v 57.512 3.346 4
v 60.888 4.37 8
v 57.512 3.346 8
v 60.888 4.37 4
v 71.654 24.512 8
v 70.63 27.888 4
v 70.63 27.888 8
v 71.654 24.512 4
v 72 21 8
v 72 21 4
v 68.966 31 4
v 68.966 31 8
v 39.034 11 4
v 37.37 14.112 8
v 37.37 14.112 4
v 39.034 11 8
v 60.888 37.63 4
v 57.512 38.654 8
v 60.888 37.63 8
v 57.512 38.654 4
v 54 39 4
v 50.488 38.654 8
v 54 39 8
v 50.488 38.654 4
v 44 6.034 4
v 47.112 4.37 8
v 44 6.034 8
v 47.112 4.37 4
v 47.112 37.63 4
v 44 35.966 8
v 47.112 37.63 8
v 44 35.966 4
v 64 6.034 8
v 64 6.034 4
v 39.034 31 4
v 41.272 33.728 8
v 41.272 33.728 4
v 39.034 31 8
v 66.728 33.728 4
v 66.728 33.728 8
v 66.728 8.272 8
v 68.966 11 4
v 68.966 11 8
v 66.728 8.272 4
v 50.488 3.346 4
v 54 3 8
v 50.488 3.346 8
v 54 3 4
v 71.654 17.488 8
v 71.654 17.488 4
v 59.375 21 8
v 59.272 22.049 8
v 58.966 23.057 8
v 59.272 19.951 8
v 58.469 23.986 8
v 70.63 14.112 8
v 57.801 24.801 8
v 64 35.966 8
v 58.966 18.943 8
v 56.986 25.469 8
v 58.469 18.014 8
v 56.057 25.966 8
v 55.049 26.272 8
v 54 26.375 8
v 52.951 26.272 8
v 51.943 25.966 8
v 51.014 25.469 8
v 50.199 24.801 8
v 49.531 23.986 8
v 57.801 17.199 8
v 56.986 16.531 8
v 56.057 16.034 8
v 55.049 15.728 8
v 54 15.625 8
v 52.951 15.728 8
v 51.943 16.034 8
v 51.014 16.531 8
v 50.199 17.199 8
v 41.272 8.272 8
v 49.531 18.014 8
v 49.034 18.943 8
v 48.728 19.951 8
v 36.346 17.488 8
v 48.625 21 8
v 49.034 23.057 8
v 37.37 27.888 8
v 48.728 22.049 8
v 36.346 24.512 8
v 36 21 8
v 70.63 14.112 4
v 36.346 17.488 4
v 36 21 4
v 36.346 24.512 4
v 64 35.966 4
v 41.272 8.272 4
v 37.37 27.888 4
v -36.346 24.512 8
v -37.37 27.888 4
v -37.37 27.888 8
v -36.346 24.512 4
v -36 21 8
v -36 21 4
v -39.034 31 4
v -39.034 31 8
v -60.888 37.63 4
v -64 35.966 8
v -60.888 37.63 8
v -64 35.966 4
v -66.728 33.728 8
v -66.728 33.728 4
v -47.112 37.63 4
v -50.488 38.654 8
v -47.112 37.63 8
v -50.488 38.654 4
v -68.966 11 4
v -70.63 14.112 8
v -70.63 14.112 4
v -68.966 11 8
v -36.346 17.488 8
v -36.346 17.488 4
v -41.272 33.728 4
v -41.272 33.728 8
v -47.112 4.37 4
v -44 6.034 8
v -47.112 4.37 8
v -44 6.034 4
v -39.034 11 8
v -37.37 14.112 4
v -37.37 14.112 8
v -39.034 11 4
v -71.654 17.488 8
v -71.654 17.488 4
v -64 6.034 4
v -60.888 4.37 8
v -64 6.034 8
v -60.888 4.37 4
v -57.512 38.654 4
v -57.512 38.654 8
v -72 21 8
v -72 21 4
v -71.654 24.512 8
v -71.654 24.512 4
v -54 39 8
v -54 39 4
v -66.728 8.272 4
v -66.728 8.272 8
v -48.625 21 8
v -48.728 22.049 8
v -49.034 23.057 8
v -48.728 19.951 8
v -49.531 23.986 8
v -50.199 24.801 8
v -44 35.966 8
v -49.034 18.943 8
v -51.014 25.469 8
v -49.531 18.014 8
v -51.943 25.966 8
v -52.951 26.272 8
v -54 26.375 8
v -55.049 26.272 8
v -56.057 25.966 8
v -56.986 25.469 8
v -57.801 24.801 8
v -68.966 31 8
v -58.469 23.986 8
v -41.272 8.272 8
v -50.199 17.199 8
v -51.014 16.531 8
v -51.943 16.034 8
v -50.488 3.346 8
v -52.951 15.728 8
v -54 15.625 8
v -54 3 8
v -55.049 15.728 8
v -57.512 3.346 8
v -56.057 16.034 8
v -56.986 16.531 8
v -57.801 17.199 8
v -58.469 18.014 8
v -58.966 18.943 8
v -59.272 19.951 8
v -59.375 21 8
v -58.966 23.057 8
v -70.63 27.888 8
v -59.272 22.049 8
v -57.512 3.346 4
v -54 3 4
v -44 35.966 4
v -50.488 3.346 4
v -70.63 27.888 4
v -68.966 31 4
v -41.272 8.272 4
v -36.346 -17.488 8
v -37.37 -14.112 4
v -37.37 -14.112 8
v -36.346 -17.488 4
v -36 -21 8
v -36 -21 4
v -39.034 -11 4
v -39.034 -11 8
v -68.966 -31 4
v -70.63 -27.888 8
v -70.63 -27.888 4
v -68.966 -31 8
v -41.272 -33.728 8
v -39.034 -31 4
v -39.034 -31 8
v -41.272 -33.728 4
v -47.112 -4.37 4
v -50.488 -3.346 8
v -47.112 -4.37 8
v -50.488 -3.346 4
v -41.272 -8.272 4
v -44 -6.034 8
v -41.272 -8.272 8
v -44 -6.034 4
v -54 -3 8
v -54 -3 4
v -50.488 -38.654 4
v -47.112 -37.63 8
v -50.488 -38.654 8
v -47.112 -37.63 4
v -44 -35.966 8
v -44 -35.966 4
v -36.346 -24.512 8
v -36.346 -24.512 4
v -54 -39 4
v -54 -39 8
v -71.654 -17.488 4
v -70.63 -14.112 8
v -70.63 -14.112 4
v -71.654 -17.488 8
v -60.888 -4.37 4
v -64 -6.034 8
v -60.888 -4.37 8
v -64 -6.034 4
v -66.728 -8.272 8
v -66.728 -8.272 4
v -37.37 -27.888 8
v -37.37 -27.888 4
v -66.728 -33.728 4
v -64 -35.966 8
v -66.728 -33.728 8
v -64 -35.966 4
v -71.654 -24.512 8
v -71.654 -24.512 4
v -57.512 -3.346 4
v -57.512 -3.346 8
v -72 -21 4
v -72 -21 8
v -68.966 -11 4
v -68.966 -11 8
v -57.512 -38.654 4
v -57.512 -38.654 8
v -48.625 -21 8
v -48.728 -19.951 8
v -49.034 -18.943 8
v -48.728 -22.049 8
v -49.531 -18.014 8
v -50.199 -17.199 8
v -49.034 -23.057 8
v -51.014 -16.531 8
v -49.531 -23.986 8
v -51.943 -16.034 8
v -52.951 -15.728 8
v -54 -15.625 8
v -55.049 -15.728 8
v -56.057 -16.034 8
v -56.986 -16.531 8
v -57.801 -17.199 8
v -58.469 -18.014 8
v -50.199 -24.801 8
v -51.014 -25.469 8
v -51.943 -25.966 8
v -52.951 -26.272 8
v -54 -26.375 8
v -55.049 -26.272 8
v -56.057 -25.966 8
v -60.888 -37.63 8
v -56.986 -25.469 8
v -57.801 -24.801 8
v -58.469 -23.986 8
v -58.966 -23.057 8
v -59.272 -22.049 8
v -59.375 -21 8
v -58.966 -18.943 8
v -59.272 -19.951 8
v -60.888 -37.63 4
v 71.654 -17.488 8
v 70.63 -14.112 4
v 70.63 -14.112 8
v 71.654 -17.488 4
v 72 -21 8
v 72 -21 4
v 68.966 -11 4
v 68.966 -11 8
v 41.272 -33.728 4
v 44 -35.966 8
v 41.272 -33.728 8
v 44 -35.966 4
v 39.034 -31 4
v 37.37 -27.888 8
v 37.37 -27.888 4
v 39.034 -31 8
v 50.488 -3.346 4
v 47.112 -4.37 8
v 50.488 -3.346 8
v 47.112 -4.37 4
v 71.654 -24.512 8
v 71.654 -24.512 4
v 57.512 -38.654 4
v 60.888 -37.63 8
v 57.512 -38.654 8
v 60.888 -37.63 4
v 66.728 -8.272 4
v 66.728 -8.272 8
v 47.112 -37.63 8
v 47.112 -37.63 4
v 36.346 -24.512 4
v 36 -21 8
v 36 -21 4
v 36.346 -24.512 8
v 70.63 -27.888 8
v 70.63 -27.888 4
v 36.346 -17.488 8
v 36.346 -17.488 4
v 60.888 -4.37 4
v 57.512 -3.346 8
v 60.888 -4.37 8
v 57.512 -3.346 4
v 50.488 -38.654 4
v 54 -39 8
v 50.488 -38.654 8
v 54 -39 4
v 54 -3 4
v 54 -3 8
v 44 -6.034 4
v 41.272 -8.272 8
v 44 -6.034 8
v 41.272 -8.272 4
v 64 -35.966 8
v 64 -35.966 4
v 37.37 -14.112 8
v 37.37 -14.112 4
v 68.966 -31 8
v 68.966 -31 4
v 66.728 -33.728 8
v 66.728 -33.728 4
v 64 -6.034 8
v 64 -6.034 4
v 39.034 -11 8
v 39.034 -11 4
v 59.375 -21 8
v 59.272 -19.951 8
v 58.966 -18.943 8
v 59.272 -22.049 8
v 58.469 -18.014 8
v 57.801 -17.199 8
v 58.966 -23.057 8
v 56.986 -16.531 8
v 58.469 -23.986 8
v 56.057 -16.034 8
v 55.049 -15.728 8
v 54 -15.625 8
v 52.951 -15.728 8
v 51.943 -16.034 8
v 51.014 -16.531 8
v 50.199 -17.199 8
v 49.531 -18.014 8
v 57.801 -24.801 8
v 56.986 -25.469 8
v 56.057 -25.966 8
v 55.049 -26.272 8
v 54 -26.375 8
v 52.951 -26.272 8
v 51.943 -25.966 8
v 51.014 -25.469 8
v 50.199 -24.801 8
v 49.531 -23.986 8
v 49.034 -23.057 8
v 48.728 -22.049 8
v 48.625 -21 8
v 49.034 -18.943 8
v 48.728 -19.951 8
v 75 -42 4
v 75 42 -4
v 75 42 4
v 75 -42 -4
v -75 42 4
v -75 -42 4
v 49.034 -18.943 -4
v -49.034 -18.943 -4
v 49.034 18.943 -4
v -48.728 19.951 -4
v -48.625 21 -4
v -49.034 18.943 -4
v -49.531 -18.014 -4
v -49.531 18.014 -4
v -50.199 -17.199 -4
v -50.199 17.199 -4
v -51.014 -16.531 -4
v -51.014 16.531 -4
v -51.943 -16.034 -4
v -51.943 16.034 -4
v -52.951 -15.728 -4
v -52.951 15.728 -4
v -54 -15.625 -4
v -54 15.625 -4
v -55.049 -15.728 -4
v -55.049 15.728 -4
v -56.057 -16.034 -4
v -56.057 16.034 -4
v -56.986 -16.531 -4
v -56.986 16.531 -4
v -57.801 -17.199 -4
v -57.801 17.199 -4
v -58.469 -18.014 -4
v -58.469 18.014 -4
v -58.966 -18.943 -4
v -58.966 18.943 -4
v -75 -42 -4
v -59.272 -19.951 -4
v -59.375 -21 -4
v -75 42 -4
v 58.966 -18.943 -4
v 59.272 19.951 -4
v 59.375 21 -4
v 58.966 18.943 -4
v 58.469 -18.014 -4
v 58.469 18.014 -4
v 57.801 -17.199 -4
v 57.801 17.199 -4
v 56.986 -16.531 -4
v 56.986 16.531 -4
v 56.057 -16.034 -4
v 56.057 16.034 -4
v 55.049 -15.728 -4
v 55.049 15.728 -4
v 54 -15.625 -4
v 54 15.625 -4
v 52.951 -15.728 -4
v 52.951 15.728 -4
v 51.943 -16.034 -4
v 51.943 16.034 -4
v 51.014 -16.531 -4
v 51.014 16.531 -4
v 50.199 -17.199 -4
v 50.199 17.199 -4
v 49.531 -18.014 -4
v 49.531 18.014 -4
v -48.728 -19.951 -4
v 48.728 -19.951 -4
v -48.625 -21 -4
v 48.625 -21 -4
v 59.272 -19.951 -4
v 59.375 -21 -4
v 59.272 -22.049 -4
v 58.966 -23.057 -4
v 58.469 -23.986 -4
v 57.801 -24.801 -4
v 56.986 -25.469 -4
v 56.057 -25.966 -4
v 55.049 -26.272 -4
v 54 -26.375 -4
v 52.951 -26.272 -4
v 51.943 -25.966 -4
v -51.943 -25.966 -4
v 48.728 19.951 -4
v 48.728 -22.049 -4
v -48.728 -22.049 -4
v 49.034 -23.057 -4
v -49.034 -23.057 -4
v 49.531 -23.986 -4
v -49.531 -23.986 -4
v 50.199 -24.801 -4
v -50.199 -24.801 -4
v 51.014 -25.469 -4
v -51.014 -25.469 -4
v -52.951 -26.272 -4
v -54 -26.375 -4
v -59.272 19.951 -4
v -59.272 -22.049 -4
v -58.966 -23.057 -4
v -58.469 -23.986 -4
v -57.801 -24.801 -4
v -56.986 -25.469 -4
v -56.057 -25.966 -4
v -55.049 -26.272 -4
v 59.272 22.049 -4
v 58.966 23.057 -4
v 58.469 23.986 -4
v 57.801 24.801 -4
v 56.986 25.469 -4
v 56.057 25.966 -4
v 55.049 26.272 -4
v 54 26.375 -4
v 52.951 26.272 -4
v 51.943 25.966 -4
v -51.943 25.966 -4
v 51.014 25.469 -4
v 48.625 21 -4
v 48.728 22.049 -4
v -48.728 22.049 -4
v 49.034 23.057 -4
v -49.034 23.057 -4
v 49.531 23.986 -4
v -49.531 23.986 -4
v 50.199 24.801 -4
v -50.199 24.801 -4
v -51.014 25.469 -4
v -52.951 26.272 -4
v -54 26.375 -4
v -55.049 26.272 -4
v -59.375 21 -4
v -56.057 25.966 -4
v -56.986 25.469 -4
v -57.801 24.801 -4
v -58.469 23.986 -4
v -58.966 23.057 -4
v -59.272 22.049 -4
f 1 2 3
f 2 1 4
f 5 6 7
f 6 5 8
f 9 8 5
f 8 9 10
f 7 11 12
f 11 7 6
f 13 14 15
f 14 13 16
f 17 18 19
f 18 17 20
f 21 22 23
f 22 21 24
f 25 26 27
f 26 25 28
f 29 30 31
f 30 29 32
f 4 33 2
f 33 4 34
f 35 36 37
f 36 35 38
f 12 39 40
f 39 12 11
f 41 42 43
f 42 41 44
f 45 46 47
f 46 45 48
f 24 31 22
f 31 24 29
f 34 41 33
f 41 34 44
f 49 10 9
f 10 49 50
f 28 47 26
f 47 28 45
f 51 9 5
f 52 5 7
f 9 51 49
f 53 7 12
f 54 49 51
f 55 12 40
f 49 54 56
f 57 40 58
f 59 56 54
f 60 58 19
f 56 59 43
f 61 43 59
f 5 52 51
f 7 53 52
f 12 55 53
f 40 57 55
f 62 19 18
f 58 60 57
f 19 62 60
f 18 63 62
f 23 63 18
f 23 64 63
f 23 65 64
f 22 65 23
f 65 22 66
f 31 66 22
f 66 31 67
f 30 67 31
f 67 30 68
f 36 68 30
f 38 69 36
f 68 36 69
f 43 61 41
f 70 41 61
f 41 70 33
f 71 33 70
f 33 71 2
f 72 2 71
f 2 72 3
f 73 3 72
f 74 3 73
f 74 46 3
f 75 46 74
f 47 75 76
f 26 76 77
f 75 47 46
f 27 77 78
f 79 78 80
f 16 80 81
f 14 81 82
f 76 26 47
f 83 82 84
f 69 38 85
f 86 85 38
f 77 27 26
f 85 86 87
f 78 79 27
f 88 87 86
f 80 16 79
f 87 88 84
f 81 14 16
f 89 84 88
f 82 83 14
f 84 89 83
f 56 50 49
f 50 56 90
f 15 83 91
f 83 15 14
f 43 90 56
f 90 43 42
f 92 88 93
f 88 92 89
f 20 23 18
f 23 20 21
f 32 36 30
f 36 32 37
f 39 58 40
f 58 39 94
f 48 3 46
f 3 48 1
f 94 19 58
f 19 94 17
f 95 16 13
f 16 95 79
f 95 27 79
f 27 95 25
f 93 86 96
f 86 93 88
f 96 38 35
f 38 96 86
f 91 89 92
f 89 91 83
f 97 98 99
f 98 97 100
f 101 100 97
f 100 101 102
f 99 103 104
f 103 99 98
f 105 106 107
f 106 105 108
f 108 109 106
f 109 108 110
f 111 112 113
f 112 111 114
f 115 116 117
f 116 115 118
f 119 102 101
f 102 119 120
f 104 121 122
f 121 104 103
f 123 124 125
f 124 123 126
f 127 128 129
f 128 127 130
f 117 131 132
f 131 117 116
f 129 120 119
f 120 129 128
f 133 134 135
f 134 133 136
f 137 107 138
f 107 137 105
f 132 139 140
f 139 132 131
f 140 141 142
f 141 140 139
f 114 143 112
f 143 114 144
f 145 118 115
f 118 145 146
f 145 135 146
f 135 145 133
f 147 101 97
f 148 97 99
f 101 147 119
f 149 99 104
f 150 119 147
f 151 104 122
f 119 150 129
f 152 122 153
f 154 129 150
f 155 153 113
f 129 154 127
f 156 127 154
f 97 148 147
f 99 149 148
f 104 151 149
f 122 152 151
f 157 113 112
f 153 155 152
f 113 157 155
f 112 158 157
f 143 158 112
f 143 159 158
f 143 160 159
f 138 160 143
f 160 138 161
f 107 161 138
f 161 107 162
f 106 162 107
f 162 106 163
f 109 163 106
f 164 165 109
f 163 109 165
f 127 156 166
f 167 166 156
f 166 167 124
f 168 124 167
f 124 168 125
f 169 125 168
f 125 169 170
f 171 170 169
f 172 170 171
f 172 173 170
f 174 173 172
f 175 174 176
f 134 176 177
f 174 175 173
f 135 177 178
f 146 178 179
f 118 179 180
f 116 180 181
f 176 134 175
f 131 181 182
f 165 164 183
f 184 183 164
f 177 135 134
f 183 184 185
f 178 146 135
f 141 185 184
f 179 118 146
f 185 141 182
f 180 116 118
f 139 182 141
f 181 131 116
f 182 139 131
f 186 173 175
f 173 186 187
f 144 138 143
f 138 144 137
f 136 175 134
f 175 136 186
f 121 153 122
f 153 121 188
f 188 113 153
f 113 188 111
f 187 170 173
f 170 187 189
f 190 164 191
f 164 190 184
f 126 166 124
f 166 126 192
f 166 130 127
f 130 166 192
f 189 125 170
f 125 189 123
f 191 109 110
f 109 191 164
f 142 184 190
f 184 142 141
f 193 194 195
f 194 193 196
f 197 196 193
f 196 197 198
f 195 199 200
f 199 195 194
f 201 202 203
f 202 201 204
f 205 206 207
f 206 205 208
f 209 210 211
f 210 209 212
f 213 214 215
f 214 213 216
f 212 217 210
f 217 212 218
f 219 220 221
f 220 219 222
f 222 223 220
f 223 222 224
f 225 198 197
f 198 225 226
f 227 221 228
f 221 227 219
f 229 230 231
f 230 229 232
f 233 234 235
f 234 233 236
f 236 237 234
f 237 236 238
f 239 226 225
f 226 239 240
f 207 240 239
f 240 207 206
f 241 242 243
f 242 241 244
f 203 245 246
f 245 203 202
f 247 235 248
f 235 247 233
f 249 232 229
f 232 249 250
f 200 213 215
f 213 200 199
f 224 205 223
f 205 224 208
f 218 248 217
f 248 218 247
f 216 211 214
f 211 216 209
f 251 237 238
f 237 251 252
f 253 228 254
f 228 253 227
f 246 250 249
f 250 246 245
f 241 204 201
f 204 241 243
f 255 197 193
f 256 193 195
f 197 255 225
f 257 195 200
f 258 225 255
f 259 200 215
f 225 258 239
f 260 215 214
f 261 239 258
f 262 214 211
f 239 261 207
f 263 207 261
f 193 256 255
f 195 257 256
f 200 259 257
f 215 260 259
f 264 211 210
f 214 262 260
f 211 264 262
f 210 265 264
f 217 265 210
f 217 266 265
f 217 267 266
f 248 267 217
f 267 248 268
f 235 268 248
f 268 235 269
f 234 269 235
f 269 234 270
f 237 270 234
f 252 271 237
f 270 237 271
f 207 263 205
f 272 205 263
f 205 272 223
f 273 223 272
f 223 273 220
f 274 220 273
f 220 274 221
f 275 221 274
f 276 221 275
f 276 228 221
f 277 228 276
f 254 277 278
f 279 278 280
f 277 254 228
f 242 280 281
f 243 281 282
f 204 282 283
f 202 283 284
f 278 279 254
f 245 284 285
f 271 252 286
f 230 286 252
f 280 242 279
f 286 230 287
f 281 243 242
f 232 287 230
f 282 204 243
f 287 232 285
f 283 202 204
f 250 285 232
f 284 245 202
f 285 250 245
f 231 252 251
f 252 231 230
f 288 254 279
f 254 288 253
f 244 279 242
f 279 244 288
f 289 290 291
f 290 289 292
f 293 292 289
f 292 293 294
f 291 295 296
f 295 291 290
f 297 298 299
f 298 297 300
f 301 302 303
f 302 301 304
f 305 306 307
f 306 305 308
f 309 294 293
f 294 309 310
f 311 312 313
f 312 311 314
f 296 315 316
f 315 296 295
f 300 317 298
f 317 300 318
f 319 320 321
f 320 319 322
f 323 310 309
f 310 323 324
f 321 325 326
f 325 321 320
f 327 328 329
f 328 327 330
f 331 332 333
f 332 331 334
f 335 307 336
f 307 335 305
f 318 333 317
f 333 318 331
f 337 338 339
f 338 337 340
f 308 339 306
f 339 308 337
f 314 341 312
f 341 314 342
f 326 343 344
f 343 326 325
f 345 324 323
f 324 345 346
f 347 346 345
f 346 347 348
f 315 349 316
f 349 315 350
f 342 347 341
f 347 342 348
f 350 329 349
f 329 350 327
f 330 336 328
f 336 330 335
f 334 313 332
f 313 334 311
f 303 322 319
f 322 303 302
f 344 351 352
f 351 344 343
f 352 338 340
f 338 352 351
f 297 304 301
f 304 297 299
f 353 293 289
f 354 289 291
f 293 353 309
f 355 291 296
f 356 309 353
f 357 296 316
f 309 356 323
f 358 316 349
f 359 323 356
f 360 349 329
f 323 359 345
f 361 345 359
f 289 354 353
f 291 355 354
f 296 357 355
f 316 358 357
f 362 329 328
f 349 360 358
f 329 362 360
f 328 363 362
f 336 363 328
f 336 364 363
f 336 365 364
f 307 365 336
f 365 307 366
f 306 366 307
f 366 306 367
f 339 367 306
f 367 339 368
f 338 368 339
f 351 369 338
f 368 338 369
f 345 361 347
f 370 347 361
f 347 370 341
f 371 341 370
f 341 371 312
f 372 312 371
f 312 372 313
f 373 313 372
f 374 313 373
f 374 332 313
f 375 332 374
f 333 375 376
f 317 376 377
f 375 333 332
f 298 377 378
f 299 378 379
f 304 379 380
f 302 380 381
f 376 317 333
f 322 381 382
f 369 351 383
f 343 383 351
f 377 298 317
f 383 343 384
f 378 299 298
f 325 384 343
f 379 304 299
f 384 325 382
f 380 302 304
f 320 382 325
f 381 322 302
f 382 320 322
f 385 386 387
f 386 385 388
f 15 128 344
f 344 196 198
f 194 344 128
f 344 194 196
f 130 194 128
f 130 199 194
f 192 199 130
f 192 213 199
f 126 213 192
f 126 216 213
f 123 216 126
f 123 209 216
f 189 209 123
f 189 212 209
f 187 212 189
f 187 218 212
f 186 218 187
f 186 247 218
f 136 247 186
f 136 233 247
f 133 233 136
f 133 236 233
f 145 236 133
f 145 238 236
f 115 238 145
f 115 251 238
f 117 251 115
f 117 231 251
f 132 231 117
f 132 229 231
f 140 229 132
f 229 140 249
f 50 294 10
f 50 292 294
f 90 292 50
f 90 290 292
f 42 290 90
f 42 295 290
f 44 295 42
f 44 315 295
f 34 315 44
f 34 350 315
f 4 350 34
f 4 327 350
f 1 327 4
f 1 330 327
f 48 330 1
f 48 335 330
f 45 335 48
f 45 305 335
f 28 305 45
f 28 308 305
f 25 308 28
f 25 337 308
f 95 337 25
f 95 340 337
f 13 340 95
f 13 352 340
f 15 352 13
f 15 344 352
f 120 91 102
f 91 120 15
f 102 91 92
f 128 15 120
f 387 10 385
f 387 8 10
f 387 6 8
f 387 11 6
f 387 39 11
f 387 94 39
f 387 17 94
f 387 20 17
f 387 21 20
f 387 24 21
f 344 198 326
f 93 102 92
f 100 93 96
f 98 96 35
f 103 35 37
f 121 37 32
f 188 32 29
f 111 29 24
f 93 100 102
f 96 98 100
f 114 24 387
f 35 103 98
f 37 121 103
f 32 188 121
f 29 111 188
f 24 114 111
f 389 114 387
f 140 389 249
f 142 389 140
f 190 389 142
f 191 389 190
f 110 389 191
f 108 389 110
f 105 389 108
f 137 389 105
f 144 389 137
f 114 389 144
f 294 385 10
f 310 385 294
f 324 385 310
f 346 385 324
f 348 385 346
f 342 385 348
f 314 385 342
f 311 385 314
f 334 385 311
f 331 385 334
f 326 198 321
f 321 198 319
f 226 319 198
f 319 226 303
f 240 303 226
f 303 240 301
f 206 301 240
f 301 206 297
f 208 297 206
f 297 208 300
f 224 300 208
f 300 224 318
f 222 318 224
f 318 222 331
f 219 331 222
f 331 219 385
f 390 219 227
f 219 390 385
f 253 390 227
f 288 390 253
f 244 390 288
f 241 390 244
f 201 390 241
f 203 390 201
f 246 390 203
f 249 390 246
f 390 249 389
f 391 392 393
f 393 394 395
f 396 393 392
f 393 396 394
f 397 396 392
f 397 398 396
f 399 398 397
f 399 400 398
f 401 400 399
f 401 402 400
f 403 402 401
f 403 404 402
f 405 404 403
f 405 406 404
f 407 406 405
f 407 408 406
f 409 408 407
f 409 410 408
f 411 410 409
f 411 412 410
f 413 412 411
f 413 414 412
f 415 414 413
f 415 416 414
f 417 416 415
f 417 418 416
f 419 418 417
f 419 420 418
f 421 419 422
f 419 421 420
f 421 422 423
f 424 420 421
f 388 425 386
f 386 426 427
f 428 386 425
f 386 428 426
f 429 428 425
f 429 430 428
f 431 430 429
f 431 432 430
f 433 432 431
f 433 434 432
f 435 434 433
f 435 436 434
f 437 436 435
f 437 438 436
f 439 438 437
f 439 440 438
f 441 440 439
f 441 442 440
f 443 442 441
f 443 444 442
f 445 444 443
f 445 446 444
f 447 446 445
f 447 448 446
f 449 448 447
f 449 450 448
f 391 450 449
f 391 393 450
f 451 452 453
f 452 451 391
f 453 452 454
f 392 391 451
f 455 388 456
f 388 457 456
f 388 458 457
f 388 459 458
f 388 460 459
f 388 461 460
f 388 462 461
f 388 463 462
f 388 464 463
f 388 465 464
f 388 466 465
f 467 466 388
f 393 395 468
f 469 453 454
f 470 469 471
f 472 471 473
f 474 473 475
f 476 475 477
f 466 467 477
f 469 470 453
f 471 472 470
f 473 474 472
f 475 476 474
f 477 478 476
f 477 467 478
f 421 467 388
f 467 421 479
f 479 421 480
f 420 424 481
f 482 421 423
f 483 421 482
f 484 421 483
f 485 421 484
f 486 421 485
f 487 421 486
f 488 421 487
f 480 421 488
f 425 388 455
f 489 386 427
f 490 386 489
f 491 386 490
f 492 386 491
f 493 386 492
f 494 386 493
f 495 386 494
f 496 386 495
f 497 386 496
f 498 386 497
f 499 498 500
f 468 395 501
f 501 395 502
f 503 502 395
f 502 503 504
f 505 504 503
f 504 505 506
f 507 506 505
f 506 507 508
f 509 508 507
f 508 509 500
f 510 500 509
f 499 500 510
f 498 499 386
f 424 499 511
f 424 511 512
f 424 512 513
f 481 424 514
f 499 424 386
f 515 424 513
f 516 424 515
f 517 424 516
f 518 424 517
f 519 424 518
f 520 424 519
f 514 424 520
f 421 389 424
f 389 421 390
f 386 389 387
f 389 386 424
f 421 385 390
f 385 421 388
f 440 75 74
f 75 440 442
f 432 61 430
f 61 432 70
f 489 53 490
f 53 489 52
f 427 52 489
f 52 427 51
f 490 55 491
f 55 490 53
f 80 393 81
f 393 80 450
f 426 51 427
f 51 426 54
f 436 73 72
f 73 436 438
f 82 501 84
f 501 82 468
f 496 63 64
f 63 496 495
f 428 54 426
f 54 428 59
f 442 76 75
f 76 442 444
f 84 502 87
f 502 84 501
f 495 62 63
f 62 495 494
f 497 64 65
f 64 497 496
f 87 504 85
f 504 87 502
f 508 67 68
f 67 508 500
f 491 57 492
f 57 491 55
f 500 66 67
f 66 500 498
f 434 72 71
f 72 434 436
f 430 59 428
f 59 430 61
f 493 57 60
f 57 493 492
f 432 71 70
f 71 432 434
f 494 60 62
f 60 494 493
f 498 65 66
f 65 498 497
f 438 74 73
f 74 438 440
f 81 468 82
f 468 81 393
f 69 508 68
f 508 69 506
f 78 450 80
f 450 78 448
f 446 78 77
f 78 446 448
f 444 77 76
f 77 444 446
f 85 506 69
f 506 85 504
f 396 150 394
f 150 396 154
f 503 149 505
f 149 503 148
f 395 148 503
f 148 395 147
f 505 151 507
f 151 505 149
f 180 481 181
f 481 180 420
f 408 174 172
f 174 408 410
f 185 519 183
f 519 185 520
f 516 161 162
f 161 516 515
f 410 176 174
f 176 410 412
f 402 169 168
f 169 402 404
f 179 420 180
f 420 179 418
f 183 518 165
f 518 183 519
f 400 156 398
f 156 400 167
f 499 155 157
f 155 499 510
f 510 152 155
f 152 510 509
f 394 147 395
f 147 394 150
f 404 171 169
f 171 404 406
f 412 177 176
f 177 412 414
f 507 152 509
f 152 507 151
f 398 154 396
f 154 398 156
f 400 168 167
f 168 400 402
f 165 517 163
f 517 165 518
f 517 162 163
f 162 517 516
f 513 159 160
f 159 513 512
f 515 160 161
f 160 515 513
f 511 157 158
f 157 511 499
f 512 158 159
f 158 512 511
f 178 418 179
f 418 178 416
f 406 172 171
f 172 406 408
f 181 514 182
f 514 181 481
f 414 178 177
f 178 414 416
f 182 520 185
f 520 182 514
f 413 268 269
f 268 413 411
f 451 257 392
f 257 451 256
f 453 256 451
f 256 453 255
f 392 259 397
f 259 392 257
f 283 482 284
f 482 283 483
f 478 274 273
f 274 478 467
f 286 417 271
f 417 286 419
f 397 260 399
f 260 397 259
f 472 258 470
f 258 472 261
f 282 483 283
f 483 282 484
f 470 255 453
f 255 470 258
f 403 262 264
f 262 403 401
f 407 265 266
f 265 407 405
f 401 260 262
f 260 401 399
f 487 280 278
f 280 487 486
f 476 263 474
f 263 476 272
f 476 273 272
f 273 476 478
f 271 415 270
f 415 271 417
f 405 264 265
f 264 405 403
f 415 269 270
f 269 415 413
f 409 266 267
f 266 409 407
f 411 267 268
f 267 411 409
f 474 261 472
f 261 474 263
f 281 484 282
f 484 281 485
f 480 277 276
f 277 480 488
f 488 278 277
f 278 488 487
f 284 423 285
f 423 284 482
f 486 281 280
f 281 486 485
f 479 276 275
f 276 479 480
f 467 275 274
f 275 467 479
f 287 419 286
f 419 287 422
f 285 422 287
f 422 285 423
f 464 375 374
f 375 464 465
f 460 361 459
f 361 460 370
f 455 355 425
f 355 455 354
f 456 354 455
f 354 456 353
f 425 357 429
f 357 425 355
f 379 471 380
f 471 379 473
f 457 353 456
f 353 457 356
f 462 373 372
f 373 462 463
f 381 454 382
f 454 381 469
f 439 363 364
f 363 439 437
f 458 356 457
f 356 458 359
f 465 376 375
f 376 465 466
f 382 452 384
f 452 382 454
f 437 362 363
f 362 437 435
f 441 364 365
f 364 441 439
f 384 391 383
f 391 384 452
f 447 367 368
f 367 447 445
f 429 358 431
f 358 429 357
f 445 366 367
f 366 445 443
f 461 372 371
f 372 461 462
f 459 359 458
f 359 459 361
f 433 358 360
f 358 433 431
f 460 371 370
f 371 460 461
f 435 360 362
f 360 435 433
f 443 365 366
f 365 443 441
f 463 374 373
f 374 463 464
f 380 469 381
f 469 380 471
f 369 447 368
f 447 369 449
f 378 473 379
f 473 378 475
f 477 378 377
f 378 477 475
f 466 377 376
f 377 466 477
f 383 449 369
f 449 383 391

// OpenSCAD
$fn = 32;

// ----------------------------------------------------------------------
// Anchor pads 150 x 84 x 12
// four corner bosses with anchor holes
// ----------------------------------------------------------------------

// --- parameters (mm) ---
plate = [150, 84, 8];    // base plate size (x, y, z)
pads = 4;                // boss count, one per corner
edge = 21;               // boss centre offset from the plate edge
boss_d = 36;             // boss diameter
boss_h = 4;              // boss height above the base plate
bore_d = 10.5;           // nominal hole diameter from the drawing
print_allowance = 0.25;  // clearance added for printing

// --- derived feature positions (mm) ---
hole_d = bore_d + print_allowance;  // = 10.75   hole diameter as printed
height = plate[2] + boss_h;         // = 12   overall height of the part
corner_x = plate[0] / 2 - edge;     // = 54   boss centre X
corner_y = plate[1] / 2 - edge;     // = 21   boss centre Y
feature_centers = [
  [corner_x, corner_y],
  [-corner_x, corner_y],
  [-corner_x, -corner_y],
  [corner_x, -corner_y]
];   // boss centres, anchor holes are drilled there

// base plate, four bosses standing on it, anchor holes all the way through
difference() {
  union() {
    cube(plate, center = true);
    for (centre = feature_centers)
      translate([centre[0], centre[1], plate[2] / 2 - 1])
        cylinder(d = boss_d, h = boss_h + 1);
  }
  for (centre = feature_centers)
    translate([centre[0], centre[1], -height])
      cylinder(d = hole_d, h = 2 * height + 2);  // through boss and plate
}
